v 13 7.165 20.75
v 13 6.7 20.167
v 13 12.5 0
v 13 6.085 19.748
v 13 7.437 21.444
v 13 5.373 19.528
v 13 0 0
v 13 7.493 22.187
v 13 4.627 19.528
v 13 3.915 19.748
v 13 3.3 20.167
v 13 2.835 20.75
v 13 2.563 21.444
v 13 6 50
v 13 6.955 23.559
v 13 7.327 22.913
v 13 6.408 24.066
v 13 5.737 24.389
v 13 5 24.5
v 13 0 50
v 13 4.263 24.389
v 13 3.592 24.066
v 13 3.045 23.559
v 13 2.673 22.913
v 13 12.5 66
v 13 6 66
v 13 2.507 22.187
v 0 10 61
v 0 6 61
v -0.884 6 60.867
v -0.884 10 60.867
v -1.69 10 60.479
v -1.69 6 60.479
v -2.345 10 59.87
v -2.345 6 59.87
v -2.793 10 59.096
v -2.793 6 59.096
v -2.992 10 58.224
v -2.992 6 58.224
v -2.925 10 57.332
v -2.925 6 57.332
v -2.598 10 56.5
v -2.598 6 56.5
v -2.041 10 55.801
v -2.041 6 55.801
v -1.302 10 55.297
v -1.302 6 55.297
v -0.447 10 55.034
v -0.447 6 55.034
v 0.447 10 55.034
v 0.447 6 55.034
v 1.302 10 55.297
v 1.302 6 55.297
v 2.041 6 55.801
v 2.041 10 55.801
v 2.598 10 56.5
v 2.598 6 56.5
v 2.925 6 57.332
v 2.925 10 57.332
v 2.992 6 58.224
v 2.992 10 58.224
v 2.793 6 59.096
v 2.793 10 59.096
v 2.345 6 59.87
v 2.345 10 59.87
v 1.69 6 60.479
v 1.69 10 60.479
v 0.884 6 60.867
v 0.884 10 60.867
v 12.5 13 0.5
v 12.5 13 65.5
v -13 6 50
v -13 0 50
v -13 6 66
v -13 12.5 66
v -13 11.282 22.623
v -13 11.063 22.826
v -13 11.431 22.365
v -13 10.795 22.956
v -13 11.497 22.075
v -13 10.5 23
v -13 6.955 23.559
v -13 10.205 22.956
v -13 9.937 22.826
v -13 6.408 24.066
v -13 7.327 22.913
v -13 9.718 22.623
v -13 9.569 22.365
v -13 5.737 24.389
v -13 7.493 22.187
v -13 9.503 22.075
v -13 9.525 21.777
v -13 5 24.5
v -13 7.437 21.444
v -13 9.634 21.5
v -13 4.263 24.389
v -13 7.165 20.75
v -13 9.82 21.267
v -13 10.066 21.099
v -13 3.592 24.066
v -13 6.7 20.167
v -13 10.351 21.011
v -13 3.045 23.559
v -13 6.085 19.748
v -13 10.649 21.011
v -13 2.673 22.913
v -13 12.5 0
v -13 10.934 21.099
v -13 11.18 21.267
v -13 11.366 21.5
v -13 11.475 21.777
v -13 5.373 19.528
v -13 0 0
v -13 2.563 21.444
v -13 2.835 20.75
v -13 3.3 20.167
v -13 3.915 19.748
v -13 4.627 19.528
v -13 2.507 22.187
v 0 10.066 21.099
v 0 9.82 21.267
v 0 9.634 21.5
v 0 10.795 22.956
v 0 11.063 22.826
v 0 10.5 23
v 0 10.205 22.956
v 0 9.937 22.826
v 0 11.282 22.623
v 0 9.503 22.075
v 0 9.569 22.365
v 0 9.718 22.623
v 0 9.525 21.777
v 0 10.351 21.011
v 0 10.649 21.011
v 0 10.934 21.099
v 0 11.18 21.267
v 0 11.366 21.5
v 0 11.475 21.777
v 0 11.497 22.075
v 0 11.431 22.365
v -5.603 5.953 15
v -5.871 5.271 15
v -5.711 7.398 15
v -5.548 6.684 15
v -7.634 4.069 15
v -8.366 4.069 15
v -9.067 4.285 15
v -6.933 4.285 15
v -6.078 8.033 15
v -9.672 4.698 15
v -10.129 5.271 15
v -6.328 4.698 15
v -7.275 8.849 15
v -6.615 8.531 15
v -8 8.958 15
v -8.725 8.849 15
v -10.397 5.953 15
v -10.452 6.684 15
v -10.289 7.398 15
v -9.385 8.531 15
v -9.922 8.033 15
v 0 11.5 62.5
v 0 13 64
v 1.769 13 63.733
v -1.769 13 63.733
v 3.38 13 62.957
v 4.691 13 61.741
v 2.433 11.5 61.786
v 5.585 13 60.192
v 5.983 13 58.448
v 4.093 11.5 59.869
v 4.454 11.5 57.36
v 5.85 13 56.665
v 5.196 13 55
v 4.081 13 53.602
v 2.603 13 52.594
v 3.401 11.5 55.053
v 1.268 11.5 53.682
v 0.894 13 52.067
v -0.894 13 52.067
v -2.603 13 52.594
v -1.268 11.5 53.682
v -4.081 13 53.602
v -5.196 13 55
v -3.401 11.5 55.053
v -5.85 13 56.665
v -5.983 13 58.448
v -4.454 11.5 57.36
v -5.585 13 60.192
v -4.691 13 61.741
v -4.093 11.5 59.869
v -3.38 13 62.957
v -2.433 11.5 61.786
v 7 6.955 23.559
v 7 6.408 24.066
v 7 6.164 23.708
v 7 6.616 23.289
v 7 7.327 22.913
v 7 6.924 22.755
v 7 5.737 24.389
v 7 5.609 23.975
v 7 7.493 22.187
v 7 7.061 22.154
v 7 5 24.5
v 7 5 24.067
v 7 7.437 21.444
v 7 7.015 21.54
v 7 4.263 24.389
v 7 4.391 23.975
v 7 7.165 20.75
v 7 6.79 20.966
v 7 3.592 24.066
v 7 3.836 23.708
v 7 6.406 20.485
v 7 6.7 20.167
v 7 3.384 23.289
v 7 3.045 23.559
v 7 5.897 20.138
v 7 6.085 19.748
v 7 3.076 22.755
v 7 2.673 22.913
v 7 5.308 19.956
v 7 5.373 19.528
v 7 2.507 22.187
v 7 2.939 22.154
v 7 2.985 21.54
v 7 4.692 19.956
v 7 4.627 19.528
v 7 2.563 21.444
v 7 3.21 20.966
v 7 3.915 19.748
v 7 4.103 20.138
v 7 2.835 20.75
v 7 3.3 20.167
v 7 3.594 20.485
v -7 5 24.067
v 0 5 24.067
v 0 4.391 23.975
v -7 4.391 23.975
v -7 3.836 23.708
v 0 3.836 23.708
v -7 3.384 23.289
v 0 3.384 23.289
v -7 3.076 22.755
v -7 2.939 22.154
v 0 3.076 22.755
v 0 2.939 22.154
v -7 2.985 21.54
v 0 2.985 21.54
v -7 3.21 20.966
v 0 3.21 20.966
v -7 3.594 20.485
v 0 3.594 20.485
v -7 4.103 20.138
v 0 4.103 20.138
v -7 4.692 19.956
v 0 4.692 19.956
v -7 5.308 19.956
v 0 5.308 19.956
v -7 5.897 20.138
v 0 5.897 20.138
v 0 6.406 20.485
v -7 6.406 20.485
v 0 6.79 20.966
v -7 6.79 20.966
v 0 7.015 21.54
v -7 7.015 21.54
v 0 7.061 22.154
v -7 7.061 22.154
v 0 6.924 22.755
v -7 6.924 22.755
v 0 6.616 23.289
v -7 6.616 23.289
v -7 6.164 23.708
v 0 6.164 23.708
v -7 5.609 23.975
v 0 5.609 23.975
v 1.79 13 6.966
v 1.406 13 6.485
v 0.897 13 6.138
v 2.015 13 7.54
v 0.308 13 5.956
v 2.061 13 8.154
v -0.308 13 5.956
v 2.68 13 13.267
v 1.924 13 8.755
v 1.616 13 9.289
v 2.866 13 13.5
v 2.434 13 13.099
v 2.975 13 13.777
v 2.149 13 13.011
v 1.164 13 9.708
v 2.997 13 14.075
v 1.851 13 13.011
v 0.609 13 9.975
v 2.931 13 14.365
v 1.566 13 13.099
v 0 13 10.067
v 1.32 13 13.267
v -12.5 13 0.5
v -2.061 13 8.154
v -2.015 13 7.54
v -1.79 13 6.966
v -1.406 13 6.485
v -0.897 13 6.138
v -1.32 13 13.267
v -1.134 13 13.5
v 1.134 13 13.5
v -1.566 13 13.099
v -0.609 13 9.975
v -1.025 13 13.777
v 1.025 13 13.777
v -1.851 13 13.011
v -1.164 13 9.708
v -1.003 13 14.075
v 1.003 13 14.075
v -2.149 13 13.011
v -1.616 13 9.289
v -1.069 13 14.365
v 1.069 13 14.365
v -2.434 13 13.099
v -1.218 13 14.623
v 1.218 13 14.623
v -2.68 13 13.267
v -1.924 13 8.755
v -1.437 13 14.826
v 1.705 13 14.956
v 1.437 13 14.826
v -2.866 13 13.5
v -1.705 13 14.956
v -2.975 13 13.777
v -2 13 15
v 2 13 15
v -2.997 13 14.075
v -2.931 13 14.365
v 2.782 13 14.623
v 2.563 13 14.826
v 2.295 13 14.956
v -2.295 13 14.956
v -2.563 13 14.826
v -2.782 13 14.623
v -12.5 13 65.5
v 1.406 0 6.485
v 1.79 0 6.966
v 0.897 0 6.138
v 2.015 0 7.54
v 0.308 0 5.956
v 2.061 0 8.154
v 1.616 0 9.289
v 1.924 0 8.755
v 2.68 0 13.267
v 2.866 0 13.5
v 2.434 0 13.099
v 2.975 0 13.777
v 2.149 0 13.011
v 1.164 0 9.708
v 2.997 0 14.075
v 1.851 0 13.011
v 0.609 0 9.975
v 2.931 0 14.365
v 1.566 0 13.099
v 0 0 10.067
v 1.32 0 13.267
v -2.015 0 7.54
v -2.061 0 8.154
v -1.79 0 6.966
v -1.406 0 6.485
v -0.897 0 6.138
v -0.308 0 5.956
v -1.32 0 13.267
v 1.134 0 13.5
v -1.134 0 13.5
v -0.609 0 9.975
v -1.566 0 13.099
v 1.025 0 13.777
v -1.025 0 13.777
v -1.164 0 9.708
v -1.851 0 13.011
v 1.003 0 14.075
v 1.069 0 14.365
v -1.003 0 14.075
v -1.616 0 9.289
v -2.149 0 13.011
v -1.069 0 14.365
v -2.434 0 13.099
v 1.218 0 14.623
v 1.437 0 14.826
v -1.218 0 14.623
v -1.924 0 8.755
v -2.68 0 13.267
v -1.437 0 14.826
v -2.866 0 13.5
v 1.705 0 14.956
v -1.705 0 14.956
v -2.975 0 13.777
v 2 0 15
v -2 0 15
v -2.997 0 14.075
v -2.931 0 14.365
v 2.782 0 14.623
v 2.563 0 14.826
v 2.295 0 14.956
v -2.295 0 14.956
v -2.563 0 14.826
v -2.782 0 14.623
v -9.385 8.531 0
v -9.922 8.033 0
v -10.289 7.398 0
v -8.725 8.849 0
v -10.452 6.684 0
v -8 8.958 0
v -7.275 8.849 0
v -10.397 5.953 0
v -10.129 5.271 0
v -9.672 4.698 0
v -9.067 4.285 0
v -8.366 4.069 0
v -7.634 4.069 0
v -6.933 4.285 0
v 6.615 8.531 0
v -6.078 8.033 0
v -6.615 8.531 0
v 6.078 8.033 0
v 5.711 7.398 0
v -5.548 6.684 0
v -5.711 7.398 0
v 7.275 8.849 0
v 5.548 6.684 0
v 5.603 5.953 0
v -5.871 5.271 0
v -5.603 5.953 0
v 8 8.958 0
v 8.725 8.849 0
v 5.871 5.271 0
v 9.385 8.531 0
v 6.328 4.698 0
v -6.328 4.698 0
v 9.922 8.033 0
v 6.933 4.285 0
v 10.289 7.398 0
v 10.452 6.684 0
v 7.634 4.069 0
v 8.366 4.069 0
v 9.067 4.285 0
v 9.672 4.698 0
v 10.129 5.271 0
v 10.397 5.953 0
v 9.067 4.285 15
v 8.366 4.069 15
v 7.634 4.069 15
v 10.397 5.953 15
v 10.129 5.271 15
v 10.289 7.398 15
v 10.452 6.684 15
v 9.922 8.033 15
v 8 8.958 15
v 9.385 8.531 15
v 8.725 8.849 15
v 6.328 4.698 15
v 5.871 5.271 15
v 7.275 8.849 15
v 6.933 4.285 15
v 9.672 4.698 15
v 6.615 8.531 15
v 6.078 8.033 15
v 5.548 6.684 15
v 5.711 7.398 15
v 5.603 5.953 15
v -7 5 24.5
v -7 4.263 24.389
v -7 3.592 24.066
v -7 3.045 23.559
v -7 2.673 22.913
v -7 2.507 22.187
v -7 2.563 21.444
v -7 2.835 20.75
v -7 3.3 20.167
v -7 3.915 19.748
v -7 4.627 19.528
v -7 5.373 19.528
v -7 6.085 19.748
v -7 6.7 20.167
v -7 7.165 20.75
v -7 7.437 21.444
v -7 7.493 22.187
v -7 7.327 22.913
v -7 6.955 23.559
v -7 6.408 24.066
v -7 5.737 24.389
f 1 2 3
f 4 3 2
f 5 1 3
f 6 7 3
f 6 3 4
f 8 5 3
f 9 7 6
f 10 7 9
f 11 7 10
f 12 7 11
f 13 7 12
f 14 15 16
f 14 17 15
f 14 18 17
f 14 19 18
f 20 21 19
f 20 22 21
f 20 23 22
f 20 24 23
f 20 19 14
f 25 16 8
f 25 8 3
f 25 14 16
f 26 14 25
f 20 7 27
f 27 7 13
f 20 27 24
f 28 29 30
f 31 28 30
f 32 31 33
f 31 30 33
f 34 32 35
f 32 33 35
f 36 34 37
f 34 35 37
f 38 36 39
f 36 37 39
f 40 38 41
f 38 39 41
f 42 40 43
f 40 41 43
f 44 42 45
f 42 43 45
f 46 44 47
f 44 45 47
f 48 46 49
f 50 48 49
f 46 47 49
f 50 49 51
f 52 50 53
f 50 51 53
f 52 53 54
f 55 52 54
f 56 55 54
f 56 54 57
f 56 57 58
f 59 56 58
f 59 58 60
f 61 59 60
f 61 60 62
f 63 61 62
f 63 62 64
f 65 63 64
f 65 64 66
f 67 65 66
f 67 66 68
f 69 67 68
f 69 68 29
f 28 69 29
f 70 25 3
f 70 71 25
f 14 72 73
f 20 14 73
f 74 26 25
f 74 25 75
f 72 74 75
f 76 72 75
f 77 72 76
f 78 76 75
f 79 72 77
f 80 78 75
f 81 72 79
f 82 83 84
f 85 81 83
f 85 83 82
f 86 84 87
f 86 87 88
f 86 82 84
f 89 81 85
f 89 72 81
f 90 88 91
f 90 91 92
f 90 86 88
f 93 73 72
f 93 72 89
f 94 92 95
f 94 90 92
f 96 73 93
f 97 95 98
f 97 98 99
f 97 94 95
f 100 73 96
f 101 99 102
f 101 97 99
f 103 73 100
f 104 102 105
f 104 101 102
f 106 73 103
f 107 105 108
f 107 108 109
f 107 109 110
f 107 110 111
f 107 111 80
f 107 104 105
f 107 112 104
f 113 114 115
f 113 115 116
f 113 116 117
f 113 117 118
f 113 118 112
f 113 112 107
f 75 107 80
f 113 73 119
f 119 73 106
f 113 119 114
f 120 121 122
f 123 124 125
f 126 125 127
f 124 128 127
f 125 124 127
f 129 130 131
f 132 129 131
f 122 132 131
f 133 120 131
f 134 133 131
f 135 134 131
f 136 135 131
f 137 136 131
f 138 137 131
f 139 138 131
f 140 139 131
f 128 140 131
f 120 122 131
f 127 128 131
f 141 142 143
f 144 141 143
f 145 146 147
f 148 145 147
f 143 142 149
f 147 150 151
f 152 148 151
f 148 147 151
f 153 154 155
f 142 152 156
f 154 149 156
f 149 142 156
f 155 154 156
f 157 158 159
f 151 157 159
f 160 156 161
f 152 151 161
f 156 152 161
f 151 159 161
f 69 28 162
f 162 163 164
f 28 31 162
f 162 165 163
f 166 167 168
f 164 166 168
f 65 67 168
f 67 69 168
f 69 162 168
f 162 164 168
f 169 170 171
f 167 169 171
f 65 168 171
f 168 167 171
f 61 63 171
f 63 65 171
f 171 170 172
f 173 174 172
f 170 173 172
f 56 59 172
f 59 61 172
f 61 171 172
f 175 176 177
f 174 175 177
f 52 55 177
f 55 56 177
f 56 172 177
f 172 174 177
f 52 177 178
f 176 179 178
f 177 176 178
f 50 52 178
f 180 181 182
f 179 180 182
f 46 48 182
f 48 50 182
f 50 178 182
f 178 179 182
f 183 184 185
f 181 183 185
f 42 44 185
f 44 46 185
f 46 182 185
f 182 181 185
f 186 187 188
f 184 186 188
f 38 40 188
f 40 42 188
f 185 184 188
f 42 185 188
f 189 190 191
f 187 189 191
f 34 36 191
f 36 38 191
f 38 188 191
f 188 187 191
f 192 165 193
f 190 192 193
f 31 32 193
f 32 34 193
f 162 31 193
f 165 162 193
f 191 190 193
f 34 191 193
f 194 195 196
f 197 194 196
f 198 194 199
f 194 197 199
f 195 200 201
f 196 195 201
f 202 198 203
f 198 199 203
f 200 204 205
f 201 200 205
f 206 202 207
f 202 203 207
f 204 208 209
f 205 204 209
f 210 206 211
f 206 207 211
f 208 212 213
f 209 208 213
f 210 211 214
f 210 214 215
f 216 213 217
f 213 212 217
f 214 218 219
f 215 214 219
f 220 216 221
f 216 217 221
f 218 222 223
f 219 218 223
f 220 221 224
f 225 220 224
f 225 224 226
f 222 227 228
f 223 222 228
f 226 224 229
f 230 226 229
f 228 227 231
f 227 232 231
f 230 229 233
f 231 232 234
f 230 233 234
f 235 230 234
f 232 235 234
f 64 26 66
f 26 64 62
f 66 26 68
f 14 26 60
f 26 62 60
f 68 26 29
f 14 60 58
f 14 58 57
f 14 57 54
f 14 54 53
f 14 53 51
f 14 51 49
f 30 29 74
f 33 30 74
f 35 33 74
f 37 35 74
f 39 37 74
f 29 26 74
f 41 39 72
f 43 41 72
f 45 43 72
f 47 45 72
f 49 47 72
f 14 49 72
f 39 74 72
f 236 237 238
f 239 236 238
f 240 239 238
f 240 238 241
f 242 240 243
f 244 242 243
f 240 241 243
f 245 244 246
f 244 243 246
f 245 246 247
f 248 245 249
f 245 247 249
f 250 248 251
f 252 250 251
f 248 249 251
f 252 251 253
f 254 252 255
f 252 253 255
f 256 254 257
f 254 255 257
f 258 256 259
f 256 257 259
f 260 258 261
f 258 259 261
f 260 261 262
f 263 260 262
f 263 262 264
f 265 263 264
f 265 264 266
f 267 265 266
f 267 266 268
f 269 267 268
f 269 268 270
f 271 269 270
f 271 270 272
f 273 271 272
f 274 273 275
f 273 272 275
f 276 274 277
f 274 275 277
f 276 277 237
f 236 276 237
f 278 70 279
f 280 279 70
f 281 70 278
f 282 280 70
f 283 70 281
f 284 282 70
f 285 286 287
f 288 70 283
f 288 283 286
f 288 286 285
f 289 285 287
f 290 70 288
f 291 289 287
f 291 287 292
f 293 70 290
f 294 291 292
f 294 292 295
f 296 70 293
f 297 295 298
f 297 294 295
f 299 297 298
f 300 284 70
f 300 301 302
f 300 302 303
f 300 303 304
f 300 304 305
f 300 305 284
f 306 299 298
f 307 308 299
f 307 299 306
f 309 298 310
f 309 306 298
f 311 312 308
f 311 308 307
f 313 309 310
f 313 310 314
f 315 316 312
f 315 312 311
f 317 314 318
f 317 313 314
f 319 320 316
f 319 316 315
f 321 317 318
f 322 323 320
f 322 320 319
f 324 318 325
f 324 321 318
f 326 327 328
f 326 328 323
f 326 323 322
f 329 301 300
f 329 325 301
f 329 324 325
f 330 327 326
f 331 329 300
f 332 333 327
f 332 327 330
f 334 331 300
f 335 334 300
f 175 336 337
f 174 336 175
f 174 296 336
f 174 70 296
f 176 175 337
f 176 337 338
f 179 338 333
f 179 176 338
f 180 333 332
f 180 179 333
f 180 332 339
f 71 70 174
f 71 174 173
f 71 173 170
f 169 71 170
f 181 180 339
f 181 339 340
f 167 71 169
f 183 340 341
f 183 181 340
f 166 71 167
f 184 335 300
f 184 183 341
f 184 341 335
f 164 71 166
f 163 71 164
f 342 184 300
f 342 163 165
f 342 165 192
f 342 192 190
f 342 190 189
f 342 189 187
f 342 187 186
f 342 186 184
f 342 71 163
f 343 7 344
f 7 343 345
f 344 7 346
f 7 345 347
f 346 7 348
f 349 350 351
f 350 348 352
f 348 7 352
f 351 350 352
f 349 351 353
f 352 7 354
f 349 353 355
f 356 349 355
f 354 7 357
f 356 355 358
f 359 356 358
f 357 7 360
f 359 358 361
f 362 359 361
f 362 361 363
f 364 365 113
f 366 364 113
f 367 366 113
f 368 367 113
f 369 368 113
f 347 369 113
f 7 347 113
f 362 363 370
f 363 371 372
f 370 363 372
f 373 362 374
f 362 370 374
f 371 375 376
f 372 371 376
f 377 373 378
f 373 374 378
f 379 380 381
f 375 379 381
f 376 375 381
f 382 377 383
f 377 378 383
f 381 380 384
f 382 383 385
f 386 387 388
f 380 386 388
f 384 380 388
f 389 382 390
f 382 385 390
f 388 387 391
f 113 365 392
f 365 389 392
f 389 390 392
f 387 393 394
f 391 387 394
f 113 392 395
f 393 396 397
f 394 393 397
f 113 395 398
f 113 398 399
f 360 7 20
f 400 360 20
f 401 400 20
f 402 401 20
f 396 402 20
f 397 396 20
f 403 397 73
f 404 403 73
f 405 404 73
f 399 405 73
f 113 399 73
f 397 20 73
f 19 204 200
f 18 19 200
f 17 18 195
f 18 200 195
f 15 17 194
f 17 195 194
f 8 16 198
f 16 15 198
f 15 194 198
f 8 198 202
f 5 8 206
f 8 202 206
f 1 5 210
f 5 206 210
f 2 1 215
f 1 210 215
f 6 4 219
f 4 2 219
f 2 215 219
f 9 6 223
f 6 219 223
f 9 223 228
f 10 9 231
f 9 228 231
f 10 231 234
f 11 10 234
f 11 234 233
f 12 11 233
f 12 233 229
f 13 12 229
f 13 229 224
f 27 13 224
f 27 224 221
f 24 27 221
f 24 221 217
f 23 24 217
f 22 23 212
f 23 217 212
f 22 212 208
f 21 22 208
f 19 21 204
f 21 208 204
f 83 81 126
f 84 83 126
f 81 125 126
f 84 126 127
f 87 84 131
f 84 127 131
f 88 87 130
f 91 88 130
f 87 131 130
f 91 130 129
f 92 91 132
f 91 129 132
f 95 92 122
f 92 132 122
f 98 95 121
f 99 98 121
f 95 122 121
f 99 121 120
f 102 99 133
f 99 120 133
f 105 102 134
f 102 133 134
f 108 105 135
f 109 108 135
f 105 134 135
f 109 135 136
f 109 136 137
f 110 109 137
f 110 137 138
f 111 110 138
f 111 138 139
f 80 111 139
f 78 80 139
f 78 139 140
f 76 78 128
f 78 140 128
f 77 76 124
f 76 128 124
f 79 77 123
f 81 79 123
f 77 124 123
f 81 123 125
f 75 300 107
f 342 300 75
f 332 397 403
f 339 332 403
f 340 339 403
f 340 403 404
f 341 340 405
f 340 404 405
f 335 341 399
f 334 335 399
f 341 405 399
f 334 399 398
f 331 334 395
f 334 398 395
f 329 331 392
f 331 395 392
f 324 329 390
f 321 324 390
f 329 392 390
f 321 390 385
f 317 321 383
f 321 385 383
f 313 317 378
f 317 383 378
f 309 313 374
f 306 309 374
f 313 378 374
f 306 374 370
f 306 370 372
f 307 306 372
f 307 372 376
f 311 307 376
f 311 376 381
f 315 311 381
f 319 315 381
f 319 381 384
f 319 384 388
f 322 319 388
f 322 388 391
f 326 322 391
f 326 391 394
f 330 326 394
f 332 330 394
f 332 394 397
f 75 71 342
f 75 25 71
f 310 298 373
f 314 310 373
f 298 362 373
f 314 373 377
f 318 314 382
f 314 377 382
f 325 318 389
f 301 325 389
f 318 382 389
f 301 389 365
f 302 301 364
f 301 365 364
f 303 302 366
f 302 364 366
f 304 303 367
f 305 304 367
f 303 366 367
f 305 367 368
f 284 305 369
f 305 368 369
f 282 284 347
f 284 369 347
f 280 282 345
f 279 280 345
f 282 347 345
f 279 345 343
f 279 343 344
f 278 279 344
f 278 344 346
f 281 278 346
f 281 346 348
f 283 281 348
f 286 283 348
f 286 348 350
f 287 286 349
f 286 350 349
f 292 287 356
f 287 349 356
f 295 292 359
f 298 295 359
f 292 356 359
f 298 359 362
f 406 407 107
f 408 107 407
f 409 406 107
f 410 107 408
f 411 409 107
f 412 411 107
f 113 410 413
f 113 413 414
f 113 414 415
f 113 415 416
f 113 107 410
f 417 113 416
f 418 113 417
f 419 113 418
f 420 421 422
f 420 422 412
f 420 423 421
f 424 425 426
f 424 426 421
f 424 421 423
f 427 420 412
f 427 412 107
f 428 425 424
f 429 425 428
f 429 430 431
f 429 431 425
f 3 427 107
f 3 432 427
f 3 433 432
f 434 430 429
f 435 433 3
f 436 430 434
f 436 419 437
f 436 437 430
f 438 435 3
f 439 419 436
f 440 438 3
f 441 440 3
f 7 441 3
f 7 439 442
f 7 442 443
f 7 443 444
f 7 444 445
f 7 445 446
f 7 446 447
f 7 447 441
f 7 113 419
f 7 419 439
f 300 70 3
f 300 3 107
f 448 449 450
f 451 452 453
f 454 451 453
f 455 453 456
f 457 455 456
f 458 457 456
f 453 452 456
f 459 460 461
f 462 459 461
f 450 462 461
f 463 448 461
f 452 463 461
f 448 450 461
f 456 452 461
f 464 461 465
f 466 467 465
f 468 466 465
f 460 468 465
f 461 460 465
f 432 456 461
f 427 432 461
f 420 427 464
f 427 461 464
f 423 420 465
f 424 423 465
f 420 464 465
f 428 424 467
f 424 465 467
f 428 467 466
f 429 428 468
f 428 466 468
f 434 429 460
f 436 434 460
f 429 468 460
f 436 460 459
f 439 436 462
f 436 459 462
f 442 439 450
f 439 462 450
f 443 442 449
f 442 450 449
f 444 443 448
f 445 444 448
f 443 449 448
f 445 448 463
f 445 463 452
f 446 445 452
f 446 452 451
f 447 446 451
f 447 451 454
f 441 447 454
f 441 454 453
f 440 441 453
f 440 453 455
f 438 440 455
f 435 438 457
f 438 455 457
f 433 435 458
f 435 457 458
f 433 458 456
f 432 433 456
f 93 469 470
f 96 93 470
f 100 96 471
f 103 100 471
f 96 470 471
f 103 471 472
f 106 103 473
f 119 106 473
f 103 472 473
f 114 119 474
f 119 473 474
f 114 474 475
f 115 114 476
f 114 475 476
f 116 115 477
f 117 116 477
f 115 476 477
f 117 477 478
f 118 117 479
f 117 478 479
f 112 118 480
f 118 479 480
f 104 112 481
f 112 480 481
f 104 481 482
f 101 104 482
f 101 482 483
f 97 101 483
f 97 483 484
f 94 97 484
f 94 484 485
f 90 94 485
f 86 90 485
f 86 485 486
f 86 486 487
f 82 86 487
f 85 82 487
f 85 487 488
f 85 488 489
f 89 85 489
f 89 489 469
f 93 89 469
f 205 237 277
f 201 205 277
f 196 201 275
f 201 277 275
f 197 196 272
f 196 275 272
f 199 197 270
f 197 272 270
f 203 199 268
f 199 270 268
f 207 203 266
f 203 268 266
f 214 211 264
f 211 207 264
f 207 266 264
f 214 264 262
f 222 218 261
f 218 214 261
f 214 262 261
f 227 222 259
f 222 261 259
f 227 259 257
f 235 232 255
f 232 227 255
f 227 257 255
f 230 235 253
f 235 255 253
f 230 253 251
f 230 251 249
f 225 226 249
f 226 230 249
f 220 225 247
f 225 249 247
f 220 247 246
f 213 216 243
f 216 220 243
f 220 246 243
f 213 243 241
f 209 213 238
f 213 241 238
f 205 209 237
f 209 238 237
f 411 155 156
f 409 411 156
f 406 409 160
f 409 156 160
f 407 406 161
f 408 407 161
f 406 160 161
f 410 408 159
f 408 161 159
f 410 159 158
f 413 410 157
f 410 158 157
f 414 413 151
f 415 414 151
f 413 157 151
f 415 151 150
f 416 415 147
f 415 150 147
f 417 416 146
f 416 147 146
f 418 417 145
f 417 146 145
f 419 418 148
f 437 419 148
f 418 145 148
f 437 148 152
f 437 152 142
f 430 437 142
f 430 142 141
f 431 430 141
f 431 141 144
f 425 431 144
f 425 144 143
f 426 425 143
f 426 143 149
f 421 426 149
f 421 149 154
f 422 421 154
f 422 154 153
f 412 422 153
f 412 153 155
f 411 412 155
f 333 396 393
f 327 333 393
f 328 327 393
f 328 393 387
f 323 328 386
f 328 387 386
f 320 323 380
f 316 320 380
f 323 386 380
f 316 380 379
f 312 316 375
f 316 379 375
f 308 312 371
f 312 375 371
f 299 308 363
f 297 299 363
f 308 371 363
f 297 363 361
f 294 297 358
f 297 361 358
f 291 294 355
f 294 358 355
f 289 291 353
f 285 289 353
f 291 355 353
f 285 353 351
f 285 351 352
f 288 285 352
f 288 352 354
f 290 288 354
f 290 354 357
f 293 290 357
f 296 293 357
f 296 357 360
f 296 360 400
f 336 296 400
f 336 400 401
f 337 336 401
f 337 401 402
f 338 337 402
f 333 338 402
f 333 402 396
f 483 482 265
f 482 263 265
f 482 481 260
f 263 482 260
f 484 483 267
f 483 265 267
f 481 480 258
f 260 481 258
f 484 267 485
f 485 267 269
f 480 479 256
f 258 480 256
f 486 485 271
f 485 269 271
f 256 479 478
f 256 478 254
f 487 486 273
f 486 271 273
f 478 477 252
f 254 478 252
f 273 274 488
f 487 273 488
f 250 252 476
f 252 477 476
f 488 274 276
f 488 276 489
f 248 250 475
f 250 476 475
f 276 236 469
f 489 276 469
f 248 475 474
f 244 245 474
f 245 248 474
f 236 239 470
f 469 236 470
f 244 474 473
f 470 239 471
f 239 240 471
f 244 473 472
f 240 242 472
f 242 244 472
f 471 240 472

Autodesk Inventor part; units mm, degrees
ref_plane "YZ Plane" through (0, 0, 0) normal (1, 0, 0) x (0, 1, 0)
ref_plane "XZ Plane" through (0, 0, 0) normal (0, 1, 0) x (-1, 0, 0)
ref_plane "XY Plane" through (0, 0, 0) normal (0, 0, 1) x (1, 0, 0)
sketch "Skizze1" plane through (0, 0, 0) normal (0, 1, 0) x (-1, 0, 0)
  line L0 (13, 0) -> (-13, 0)
  line L1 (-13, 0) -> (-13, 66)
  line L2 (-13, 66) -> (13, 66)
  line L3 (13, 66) -> (13, 0)
  point P0 (0, 0)
  point P1 (0, 0)
  dimension "d0" = 66
  dimension "d1" = 26
extrude "Extrusion1" add sketch "Skizze1" along normal blind 13
sketch "Skizze2" plane through (-13, 0, 0) normal (-1, 0, 0) x (0, 0, 1)
  line L0 (66, 0) -> (66, 13) projected
  line L1 (66, 6) -> (50, 6)
  line L2 (0, 13) -> (66, 13) projected
  line L3 (50, 6) -> (50, 0)
  line L4 (50, 0) -> (66, 0)
  line L5 (66, 6) -> (66, 0)
  point P0 (0, 0)
  dimension "d4" = 7
  dimension "d5" = 16
extrude "Extrusion2" cut sketch "Skizze2" against normal up to surface (26 mm away)
sketch "Skizze3" plane through (0, 13, 0) normal (0, 1, 0) x (1, 0, 0)
  line L0 (-13, -66) -> (13, -66) projected
  line L1 (13, 0) -> (-13, 0) projected
  point P0 (0, 0)
  point P1 (0, -58)
  point P2 (0, 0)
  dimension "d8" = 8
hole "Bohrung1" at (0, 13, 58) direction (0, -1, 0) diameter 6 depth 7 countersink diameter 12 countersink angle 90
sketch "Skizze4" plane through (0, 13, 0) normal (0, 1, 0) x (1, 0, 0)
  line L0 (13, 0) -> (-13, 0) projected
  point P0 (0, 0)
  point P1 (0, -8)
  point P2 (0, 0)
  point P3 (0, 0)
  dimension "d23" = 8
hole "Bohrung2" at (0, 13, 8) direction (0, -1, 0) diameter 4.134 depth 13 thread size "M5x0.8" class "6H" standard "ISO Metric profile"
sketch "Skizze5" plane through (0, 13, 0) normal (0, 1, 0) x (1, 0, 0)
  line L0 (13, 0) -> (-13, 0) projected
  point P0 (0, 0)
  point P1 (2, -14)
  point P2 (-2, -14)
  point P3 (0, 0)
  point P4 (0, 0)
  dimension "d31" = 2
  dimension "d32" = 2
  dimension "d33" = 14
  dimension "d34" = 14
hole "Bohrung3" at (2, 13, 14) at (-2, 13, 14) direction (0, -1, 0) diameter 2 depth 13
sketch "Skizze6" plane through (-13, 0, 0) normal (-1, 0, 0) x (0, 0, 1)
  line L0 (0, 0) -> (50, 0) projected
  point P0 (22, 10.5)
  point P1 (22, 5)
  dimension "d42" = 22
  dimension "d43" = 5
  dimension "d44" = 5.5
hole "Bohrung4" at (-13, 5, 22) direction (1, 0, 0) diameter 4.134 depth 13 counterbore diameter 5 counterbore depth 6 thread size "M5x0.8" class "6H" standard "ISO Metric profile"
hole "Bohrung5" at (-13, 10.5, 22) direction (1, 0, 0) diameter 2 depth 13
mirror "Spiegeln1" about plane through (0, 0, 0) normal (1, 0, 0) of "Bohrung4"
chamfer "Fasen1" distance 0.5 angle 45 4 edges at (-13, 13, 33) (0, 13, 66) (13, 13, 33) (0, 13, 0)
sketch "Skizze7" plane through (13, 0, 0) normal (0, 0, -1) x (-1, 0, 0)
  line L0 (0, 0) -> (0, 12.5) projected
  line L1 (0, 0) -> (26, 0) projected
  point P0 (13, 0)
  point P1 (5, 6.5)
  point P2 (21, 6.5)
  point P3 (0, 6.25)
  point P4 (0, 6.25)
  dimension "d62" = 5
  dimension "d63" = 16
  dimension "d64" = 6.5
hole "Bohrung6" at (8, 6.5, 0) at (-8, 6.5, 0) direction (0, 0, 1) diameter 4.917 depth 15 thread size "M6x1" class "6H" standard "ISO Metric profile"
properties part number "support" material "Aluminium 6061"
